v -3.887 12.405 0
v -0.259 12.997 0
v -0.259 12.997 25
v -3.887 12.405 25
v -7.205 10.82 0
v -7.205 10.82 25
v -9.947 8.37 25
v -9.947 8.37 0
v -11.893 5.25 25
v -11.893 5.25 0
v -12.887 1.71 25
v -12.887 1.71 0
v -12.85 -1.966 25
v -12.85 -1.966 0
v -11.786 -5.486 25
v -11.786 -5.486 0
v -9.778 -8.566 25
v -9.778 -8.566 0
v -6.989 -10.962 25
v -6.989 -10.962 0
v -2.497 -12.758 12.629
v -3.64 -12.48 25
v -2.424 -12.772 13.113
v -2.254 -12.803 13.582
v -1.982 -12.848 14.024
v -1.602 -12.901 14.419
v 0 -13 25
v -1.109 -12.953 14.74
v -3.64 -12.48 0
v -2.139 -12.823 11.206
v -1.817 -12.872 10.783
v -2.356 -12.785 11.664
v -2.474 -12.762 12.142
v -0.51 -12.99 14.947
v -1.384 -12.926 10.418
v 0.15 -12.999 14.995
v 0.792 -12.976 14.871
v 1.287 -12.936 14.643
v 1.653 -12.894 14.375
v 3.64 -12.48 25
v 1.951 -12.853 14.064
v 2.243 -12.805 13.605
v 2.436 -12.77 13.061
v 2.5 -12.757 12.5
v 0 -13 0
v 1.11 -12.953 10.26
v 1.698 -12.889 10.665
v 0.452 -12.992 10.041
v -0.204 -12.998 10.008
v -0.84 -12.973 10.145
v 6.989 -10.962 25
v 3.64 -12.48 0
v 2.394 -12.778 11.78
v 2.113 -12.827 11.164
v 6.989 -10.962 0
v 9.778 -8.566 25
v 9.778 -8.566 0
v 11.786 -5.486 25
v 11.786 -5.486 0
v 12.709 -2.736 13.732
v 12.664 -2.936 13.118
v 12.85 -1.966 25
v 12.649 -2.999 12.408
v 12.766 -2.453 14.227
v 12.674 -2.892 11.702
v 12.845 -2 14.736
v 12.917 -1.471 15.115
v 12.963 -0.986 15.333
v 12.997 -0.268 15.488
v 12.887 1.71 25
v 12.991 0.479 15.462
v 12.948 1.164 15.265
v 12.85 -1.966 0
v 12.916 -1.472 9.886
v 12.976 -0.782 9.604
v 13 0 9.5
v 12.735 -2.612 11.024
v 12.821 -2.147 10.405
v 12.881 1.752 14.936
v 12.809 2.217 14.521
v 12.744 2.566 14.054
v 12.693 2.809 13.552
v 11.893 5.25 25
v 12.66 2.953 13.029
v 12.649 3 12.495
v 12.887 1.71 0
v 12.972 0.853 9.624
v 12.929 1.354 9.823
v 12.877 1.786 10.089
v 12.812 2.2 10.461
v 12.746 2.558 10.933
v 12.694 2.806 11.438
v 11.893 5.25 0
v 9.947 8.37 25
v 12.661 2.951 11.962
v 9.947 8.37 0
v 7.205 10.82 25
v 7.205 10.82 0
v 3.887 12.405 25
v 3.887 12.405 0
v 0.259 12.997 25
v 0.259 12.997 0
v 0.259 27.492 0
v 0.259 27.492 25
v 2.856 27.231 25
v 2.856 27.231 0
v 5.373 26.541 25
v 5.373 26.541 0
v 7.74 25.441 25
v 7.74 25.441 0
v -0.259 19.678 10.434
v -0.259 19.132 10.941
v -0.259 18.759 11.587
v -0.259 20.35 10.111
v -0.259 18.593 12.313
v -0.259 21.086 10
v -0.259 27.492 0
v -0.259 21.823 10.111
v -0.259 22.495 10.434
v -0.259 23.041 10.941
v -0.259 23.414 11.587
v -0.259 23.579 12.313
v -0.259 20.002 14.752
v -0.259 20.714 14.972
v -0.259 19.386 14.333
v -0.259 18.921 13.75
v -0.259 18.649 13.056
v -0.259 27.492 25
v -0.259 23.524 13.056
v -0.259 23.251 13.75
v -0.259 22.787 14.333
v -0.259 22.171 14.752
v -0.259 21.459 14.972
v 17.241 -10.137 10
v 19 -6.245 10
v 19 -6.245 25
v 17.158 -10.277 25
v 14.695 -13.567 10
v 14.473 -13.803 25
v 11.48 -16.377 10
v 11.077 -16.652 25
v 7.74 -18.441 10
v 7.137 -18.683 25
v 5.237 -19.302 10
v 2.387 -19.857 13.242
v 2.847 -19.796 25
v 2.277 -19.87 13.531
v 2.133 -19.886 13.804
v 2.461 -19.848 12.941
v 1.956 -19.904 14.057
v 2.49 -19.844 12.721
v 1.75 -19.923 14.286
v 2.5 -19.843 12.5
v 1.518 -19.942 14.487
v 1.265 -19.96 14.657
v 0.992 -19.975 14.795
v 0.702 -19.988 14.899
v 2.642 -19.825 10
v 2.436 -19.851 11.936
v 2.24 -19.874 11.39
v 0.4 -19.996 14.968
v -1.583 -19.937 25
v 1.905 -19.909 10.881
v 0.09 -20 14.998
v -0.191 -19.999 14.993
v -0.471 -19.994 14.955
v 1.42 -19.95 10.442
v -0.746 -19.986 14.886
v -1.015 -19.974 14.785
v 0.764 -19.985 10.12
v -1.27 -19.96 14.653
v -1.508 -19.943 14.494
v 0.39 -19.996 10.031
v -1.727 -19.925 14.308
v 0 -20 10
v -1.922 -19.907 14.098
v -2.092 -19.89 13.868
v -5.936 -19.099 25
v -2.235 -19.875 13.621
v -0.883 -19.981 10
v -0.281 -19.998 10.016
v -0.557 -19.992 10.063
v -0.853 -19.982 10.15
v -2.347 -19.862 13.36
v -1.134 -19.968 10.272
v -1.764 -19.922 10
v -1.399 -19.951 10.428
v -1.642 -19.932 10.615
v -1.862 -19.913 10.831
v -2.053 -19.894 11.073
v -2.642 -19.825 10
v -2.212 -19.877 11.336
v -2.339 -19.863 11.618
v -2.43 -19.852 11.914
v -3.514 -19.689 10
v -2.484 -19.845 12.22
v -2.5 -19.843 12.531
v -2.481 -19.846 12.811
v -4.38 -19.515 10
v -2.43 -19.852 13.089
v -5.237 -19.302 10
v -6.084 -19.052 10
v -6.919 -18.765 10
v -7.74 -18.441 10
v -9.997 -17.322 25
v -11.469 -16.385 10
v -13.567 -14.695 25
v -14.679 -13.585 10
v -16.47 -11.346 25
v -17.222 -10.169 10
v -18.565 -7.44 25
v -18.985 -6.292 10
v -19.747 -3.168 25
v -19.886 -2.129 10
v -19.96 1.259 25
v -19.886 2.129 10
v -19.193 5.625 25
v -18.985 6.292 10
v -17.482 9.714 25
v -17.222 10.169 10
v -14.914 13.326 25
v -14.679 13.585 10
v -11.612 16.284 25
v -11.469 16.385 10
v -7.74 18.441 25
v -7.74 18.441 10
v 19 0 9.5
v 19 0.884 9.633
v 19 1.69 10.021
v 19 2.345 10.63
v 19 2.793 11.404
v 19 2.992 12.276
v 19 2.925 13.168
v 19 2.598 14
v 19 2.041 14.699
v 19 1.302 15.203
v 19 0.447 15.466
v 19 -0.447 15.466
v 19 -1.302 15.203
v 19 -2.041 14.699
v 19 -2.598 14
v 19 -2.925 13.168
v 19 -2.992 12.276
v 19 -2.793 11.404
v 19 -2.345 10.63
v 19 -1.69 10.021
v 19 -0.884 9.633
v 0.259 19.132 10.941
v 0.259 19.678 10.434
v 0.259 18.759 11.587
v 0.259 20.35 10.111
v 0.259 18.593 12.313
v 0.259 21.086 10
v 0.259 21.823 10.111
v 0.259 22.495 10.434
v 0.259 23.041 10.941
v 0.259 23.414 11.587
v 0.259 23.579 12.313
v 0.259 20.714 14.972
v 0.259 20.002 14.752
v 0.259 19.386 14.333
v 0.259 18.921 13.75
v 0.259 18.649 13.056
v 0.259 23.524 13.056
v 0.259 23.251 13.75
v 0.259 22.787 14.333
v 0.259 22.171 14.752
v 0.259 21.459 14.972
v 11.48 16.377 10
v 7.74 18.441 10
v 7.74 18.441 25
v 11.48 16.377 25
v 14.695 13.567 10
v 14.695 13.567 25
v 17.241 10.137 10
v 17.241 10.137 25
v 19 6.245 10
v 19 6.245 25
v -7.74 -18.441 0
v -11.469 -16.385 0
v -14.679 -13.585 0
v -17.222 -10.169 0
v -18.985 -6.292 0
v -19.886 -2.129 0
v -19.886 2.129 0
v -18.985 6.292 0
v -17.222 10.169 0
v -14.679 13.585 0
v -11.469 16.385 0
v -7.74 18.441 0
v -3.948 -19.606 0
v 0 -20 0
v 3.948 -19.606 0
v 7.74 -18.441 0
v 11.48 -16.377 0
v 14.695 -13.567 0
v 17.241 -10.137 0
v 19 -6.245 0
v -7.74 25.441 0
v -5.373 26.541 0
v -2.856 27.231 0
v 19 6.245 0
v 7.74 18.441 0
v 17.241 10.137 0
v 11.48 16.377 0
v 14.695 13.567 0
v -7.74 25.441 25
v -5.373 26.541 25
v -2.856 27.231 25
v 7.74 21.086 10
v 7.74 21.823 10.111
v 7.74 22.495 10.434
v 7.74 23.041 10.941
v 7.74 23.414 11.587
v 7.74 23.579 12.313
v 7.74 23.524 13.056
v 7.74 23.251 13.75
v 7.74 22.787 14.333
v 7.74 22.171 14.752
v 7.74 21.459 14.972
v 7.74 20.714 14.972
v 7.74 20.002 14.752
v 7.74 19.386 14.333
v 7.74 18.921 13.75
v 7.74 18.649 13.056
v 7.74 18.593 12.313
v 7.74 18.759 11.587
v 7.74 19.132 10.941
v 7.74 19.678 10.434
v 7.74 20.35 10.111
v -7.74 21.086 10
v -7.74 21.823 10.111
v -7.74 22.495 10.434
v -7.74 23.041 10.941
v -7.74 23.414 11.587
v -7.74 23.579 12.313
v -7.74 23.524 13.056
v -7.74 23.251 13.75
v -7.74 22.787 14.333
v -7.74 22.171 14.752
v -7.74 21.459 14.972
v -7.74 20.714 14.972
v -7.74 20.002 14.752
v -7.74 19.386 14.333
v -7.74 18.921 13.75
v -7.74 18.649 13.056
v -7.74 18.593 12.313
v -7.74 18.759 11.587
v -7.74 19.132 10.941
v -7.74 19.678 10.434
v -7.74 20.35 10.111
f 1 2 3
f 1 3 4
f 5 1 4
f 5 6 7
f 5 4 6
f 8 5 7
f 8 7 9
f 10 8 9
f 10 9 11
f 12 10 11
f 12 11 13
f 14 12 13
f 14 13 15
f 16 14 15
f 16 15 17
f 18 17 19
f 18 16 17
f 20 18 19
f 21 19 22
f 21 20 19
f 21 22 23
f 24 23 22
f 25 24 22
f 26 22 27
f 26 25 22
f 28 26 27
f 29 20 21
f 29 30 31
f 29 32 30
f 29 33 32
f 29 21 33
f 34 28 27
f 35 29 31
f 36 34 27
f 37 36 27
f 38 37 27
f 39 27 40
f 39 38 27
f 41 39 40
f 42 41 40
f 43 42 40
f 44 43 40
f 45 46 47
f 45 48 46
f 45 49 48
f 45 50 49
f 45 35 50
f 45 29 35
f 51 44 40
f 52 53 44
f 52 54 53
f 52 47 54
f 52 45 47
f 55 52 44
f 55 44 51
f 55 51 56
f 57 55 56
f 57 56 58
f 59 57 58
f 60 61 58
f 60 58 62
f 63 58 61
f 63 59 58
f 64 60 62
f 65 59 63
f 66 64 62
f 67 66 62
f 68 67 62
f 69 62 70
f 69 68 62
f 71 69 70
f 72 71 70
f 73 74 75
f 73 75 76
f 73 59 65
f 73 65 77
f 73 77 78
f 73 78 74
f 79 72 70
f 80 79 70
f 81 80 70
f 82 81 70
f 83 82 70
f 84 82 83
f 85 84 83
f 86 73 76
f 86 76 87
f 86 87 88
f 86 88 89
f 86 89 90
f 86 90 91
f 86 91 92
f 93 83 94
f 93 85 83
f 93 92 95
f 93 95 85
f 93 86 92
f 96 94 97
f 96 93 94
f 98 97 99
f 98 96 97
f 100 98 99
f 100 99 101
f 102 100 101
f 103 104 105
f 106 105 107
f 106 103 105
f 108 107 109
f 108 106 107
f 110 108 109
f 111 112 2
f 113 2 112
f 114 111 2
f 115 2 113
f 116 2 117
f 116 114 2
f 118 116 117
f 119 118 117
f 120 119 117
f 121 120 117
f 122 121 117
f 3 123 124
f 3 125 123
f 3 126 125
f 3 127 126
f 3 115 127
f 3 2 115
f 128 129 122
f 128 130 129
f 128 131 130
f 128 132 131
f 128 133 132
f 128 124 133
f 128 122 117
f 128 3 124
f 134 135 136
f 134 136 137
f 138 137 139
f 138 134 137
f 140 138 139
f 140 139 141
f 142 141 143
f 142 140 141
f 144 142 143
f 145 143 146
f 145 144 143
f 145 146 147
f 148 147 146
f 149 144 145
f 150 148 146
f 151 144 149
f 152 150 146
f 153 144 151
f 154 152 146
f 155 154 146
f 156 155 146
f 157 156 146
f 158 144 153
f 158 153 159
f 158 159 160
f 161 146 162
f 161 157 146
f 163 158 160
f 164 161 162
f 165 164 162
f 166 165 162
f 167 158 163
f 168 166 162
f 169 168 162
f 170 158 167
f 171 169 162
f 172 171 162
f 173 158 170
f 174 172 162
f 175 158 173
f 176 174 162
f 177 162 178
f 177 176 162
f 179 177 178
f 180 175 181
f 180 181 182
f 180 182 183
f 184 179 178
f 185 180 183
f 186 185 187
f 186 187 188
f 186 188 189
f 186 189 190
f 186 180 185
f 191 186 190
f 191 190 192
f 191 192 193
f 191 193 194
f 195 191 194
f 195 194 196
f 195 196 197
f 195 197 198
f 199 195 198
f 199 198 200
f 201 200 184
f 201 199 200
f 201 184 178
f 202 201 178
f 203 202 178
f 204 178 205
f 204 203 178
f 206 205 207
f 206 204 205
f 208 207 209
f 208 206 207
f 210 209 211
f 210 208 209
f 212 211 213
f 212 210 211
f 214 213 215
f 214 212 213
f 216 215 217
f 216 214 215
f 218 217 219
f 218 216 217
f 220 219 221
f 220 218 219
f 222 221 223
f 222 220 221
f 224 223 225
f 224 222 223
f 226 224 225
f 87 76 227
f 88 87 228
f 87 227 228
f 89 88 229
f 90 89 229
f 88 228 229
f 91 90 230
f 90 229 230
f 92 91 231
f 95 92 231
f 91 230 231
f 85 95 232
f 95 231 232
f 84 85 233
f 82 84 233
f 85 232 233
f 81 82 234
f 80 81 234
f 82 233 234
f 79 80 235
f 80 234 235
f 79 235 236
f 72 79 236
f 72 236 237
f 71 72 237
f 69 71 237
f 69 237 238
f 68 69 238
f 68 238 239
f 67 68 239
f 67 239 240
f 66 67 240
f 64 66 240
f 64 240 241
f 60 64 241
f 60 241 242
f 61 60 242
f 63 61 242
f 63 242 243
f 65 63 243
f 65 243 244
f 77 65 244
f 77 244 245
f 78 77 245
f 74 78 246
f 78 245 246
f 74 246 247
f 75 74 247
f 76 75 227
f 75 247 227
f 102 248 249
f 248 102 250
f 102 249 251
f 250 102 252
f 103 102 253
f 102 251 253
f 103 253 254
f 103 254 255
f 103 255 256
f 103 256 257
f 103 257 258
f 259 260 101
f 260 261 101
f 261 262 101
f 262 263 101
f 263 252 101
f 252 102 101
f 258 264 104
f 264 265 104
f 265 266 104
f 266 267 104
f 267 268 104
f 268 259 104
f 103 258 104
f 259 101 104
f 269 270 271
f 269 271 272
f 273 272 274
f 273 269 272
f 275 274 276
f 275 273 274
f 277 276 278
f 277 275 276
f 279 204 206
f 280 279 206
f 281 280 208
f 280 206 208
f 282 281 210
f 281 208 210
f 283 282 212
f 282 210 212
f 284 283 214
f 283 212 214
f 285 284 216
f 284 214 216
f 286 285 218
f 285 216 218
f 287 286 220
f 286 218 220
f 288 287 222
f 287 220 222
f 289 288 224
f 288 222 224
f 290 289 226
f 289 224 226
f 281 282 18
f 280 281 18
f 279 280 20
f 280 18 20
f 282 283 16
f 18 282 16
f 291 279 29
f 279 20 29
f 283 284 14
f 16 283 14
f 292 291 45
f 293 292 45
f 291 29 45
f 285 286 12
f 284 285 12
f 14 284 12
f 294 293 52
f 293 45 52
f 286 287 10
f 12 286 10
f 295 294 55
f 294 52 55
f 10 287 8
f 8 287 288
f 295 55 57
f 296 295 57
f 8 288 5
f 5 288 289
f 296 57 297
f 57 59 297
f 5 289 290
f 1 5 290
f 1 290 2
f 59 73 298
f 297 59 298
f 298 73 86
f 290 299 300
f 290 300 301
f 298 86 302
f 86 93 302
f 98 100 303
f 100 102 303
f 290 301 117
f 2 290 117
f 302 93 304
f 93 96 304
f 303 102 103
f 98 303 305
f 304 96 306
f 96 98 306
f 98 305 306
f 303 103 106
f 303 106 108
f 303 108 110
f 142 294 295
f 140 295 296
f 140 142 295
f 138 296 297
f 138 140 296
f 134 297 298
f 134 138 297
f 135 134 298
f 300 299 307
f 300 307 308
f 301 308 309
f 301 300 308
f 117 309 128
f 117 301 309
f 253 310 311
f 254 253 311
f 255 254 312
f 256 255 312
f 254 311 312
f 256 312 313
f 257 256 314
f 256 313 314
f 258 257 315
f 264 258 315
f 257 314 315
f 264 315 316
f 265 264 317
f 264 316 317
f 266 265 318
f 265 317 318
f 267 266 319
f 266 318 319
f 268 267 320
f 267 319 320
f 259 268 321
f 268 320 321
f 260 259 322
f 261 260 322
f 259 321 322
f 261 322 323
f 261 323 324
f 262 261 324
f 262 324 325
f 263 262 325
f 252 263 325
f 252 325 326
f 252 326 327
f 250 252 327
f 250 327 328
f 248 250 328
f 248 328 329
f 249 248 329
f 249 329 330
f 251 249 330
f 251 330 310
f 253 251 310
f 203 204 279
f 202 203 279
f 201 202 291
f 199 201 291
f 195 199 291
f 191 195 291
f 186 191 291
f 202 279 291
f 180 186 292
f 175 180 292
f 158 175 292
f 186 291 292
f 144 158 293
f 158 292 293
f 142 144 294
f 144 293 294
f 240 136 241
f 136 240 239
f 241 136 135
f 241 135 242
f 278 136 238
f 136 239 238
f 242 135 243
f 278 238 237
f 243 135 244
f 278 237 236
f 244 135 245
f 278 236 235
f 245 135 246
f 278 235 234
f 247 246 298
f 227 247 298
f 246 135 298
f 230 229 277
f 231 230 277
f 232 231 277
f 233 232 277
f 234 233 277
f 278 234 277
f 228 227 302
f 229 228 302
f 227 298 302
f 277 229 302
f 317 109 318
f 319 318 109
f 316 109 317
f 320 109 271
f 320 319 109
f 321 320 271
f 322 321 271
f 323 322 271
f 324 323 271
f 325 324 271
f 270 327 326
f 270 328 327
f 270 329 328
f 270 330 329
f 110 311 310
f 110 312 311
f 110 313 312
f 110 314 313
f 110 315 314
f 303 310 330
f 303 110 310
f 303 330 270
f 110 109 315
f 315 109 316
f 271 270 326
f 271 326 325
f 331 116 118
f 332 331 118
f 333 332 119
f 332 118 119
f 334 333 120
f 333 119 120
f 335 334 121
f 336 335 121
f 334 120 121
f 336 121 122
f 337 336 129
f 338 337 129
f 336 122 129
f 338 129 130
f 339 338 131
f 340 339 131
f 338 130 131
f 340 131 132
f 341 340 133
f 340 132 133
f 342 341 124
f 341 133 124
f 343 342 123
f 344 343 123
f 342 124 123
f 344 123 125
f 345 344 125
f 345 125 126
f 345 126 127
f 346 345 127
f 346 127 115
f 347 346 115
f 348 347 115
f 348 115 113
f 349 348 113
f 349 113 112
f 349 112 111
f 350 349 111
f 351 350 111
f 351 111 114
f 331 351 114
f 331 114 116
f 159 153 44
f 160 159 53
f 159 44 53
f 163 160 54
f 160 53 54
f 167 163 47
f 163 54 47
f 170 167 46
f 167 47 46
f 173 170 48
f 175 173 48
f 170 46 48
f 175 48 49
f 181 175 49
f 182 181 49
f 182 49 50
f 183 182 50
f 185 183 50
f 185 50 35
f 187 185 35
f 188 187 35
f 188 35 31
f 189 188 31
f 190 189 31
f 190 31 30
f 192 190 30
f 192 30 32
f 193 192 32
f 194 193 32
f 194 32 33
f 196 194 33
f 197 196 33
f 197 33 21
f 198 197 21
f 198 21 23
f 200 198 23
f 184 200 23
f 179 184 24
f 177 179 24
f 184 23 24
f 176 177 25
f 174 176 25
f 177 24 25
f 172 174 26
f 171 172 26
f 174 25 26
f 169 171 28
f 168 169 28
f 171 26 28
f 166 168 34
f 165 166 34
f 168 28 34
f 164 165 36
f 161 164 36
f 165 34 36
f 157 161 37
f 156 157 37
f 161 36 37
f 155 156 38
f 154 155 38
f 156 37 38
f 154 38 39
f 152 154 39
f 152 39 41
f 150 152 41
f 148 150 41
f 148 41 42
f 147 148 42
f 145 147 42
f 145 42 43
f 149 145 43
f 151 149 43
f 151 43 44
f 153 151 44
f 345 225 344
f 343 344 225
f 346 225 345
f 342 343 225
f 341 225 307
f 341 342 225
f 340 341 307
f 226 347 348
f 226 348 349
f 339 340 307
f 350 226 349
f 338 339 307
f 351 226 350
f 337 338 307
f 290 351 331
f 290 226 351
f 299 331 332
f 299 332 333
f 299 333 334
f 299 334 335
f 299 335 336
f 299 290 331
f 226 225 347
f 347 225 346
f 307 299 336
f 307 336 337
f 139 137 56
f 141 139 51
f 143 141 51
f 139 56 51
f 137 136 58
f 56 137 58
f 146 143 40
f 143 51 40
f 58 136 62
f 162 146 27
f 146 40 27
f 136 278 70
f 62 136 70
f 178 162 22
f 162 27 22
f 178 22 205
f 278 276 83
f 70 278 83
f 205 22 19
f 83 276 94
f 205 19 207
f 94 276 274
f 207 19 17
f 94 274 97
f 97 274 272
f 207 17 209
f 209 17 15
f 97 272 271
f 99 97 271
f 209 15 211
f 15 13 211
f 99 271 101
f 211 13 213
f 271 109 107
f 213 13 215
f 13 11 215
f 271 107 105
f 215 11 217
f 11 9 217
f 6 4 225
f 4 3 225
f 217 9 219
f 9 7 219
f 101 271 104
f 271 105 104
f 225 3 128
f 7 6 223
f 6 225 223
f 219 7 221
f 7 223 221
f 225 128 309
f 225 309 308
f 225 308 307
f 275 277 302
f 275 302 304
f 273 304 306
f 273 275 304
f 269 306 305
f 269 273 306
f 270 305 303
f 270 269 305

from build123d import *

# Parameters (mm, degrees)
SKETCH_1_R          = 3.5
SKETCH_1_R_2        = 13
EXTRUDE_2_DEPTH     = 10
SKETCH_2_R          = 13
EXTRUDE_3_DEPTH     = 15
SKETCH_3_W          = 0.517195108
SKETCH_3_H          = 18.726193104
CUT_EXTRUDE_1_DEPTH = 26
SKETCH_4_R          = 2.5
CUT_EXTRUDE_2_DEPTH = 43.740275714
CUT_EXTRUDE_3_DEPTH = 11
SKETCH_6_R          = 2.5
CUT_EXTRUDE_4_DEPTH = 21
SKETCH_8_W          = 5
SKETCH_8_H          = 30
CUT_EXTRUDE_5_DEPTH = 26.0000001
SKETCH_9_R          = 3
CUT_EXTRUDE_6_DEPTH = 10


with BuildPart() as part:
    # 草图1 → 凸台-拉伸2 (new body)
    with BuildSketch(Plane.XY):
        with BuildLine():
            Line((-35, -7), (-7.740275714, -18.44147857))
            ThreePointArc((-7.740275714, -18.44147857), (0, -20), (7.740275714, -18.44147857))
            Line((7.740275714, -18.44147857), (35, -7))
            Line((35, -7), (35, 7))
            Line((35, 7), (7.740275714, 18.44147857))
            Line((7.740275714, 18.44147857), (7.740275714, 25.44147857))
            ThreePointArc((7.740275714, 25.44147857), (0, 27.494244152), (-7.740275714, 25.44147857))
            Line((-7.740275714, 25.44147857), (-7.740275714, 18.44147857))
            Line((-7.740275714, 18.44147857), (-35, 7))
            Line((-35, 7), (-35, -7))
        make_face()
        with Locations((-28, 0)):
            Circle(SKETCH_1_R, mode=Mode.SUBTRACT)
        Circle(SKETCH_1_R_2, mode=Mode.SUBTRACT)
        with Locations((28, 0)):
            Circle(SKETCH_1_R, mode=Mode.SUBTRACT)
    extrude(amount=EXTRUDE_2_DEPTH)

    # 草图2 → 凸台-拉伸3 (add)
    with BuildSketch(Plane.XY.offset(10)):
        with BuildLine():
            Line((-7.740275714, 18.44147857), (-7.740275714, 25.44147857))
            ThreePointArc((-7.740275714, 25.44147857), (0, 27.494244152), (7.740275714, 25.44147857))
            Line((7.740275714, 25.44147857), (7.740275714, 18.44147857))
            ThreePointArc((7.740275714, 18.44147857), (0, -20), (-7.740275714, 18.44147857))
        make_face()
        Circle(SKETCH_2_R, mode=Mode.SUBTRACT)
    extrude(amount=EXTRUDE_3_DEPTH)

    # 草图3 → 切除-拉伸1 (cut, through all)
    with BuildSketch(Plane.XY.offset(25)):
        with Locations((0, 21.741202931)):
            Rectangle(SKETCH_3_W, SKETCH_3_H)
    extrude(amount=-CUT_EXTRUDE_1_DEPTH, mode=Mode.SUBTRACT)

    # 草图4 → 切除-拉伸2 (cut, through all)
    with BuildSketch(Plane(origin=(7.740275714, 0, 0), x_dir=(0, 0, -1), z_dir=(1, 0, 0))):
        with Locations((-12.5, 21.086423576)):
            Circle(SKETCH_4_R)
    extrude(amount=-CUT_EXTRUDE_2_DEPTH, mode=Mode.SUBTRACT)

    # 草图5 → 切除-拉伸3 (cut, through all)
    with BuildSketch(Plane.XY.offset(10)):
        with BuildLine():
            Line((-7.740275714, 18.44147857), (-35, 7))
            Line((-35, 7), (-35, -7))
            Line((-35, -7), (-7.740275714, -18.44147857))
            ThreePointArc((-7.740275714, -18.44147857), (-20, 0), (-7.740275714, 18.44147857))
        make_face()
        with BuildLine():
            Line((7.740275714, 18.44147857), (35, 7))
            Line((35, 7), (35, -7))
            Line((35, -7), (7.740275714, -18.44147857))
            ThreePointArc((7.740275714, -18.44147857), (20, 0), (7.740275714, 18.44147857))
        make_face()
    extrude(amount=-CUT_EXTRUDE_3_DEPTH, mode=Mode.SUBTRACT)

    # 草图6 → 切除-拉伸4 (cut, through all)
    with BuildSketch(Plane(origin=(0, 0, 0), x_dir=(1, 0, 0), z_dir=(0, 1, 0))):
        with Locations((0, -12.5)):
            Circle(SKETCH_6_R)
    extrude(amount=-CUT_EXTRUDE_4_DEPTH, mode=Mode.SUBTRACT)

    # 草图8 → 切除-拉伸5 (cut, through all)
    with BuildSketch(Plane.XY):
        with Locations((21.5, 0)):
            Rectangle(SKETCH_8_W, SKETCH_8_H)
    extrude(amount=CUT_EXTRUDE_5_DEPTH, mode=Mode.SUBTRACT)

    # 草图9 → 切除-拉伸6 (cut)
    with BuildSketch(Plane(origin=(19, 0, 0), x_dir=(0, 0, -1), z_dir=(1, 0, 0))):
        with Locations((-12.5, 0)):
            Circle(SKETCH_9_R)
    extrude(amount=-CUT_EXTRUDE_6_DEPTH, mode=Mode.SUBTRACT)


solid = part.part
